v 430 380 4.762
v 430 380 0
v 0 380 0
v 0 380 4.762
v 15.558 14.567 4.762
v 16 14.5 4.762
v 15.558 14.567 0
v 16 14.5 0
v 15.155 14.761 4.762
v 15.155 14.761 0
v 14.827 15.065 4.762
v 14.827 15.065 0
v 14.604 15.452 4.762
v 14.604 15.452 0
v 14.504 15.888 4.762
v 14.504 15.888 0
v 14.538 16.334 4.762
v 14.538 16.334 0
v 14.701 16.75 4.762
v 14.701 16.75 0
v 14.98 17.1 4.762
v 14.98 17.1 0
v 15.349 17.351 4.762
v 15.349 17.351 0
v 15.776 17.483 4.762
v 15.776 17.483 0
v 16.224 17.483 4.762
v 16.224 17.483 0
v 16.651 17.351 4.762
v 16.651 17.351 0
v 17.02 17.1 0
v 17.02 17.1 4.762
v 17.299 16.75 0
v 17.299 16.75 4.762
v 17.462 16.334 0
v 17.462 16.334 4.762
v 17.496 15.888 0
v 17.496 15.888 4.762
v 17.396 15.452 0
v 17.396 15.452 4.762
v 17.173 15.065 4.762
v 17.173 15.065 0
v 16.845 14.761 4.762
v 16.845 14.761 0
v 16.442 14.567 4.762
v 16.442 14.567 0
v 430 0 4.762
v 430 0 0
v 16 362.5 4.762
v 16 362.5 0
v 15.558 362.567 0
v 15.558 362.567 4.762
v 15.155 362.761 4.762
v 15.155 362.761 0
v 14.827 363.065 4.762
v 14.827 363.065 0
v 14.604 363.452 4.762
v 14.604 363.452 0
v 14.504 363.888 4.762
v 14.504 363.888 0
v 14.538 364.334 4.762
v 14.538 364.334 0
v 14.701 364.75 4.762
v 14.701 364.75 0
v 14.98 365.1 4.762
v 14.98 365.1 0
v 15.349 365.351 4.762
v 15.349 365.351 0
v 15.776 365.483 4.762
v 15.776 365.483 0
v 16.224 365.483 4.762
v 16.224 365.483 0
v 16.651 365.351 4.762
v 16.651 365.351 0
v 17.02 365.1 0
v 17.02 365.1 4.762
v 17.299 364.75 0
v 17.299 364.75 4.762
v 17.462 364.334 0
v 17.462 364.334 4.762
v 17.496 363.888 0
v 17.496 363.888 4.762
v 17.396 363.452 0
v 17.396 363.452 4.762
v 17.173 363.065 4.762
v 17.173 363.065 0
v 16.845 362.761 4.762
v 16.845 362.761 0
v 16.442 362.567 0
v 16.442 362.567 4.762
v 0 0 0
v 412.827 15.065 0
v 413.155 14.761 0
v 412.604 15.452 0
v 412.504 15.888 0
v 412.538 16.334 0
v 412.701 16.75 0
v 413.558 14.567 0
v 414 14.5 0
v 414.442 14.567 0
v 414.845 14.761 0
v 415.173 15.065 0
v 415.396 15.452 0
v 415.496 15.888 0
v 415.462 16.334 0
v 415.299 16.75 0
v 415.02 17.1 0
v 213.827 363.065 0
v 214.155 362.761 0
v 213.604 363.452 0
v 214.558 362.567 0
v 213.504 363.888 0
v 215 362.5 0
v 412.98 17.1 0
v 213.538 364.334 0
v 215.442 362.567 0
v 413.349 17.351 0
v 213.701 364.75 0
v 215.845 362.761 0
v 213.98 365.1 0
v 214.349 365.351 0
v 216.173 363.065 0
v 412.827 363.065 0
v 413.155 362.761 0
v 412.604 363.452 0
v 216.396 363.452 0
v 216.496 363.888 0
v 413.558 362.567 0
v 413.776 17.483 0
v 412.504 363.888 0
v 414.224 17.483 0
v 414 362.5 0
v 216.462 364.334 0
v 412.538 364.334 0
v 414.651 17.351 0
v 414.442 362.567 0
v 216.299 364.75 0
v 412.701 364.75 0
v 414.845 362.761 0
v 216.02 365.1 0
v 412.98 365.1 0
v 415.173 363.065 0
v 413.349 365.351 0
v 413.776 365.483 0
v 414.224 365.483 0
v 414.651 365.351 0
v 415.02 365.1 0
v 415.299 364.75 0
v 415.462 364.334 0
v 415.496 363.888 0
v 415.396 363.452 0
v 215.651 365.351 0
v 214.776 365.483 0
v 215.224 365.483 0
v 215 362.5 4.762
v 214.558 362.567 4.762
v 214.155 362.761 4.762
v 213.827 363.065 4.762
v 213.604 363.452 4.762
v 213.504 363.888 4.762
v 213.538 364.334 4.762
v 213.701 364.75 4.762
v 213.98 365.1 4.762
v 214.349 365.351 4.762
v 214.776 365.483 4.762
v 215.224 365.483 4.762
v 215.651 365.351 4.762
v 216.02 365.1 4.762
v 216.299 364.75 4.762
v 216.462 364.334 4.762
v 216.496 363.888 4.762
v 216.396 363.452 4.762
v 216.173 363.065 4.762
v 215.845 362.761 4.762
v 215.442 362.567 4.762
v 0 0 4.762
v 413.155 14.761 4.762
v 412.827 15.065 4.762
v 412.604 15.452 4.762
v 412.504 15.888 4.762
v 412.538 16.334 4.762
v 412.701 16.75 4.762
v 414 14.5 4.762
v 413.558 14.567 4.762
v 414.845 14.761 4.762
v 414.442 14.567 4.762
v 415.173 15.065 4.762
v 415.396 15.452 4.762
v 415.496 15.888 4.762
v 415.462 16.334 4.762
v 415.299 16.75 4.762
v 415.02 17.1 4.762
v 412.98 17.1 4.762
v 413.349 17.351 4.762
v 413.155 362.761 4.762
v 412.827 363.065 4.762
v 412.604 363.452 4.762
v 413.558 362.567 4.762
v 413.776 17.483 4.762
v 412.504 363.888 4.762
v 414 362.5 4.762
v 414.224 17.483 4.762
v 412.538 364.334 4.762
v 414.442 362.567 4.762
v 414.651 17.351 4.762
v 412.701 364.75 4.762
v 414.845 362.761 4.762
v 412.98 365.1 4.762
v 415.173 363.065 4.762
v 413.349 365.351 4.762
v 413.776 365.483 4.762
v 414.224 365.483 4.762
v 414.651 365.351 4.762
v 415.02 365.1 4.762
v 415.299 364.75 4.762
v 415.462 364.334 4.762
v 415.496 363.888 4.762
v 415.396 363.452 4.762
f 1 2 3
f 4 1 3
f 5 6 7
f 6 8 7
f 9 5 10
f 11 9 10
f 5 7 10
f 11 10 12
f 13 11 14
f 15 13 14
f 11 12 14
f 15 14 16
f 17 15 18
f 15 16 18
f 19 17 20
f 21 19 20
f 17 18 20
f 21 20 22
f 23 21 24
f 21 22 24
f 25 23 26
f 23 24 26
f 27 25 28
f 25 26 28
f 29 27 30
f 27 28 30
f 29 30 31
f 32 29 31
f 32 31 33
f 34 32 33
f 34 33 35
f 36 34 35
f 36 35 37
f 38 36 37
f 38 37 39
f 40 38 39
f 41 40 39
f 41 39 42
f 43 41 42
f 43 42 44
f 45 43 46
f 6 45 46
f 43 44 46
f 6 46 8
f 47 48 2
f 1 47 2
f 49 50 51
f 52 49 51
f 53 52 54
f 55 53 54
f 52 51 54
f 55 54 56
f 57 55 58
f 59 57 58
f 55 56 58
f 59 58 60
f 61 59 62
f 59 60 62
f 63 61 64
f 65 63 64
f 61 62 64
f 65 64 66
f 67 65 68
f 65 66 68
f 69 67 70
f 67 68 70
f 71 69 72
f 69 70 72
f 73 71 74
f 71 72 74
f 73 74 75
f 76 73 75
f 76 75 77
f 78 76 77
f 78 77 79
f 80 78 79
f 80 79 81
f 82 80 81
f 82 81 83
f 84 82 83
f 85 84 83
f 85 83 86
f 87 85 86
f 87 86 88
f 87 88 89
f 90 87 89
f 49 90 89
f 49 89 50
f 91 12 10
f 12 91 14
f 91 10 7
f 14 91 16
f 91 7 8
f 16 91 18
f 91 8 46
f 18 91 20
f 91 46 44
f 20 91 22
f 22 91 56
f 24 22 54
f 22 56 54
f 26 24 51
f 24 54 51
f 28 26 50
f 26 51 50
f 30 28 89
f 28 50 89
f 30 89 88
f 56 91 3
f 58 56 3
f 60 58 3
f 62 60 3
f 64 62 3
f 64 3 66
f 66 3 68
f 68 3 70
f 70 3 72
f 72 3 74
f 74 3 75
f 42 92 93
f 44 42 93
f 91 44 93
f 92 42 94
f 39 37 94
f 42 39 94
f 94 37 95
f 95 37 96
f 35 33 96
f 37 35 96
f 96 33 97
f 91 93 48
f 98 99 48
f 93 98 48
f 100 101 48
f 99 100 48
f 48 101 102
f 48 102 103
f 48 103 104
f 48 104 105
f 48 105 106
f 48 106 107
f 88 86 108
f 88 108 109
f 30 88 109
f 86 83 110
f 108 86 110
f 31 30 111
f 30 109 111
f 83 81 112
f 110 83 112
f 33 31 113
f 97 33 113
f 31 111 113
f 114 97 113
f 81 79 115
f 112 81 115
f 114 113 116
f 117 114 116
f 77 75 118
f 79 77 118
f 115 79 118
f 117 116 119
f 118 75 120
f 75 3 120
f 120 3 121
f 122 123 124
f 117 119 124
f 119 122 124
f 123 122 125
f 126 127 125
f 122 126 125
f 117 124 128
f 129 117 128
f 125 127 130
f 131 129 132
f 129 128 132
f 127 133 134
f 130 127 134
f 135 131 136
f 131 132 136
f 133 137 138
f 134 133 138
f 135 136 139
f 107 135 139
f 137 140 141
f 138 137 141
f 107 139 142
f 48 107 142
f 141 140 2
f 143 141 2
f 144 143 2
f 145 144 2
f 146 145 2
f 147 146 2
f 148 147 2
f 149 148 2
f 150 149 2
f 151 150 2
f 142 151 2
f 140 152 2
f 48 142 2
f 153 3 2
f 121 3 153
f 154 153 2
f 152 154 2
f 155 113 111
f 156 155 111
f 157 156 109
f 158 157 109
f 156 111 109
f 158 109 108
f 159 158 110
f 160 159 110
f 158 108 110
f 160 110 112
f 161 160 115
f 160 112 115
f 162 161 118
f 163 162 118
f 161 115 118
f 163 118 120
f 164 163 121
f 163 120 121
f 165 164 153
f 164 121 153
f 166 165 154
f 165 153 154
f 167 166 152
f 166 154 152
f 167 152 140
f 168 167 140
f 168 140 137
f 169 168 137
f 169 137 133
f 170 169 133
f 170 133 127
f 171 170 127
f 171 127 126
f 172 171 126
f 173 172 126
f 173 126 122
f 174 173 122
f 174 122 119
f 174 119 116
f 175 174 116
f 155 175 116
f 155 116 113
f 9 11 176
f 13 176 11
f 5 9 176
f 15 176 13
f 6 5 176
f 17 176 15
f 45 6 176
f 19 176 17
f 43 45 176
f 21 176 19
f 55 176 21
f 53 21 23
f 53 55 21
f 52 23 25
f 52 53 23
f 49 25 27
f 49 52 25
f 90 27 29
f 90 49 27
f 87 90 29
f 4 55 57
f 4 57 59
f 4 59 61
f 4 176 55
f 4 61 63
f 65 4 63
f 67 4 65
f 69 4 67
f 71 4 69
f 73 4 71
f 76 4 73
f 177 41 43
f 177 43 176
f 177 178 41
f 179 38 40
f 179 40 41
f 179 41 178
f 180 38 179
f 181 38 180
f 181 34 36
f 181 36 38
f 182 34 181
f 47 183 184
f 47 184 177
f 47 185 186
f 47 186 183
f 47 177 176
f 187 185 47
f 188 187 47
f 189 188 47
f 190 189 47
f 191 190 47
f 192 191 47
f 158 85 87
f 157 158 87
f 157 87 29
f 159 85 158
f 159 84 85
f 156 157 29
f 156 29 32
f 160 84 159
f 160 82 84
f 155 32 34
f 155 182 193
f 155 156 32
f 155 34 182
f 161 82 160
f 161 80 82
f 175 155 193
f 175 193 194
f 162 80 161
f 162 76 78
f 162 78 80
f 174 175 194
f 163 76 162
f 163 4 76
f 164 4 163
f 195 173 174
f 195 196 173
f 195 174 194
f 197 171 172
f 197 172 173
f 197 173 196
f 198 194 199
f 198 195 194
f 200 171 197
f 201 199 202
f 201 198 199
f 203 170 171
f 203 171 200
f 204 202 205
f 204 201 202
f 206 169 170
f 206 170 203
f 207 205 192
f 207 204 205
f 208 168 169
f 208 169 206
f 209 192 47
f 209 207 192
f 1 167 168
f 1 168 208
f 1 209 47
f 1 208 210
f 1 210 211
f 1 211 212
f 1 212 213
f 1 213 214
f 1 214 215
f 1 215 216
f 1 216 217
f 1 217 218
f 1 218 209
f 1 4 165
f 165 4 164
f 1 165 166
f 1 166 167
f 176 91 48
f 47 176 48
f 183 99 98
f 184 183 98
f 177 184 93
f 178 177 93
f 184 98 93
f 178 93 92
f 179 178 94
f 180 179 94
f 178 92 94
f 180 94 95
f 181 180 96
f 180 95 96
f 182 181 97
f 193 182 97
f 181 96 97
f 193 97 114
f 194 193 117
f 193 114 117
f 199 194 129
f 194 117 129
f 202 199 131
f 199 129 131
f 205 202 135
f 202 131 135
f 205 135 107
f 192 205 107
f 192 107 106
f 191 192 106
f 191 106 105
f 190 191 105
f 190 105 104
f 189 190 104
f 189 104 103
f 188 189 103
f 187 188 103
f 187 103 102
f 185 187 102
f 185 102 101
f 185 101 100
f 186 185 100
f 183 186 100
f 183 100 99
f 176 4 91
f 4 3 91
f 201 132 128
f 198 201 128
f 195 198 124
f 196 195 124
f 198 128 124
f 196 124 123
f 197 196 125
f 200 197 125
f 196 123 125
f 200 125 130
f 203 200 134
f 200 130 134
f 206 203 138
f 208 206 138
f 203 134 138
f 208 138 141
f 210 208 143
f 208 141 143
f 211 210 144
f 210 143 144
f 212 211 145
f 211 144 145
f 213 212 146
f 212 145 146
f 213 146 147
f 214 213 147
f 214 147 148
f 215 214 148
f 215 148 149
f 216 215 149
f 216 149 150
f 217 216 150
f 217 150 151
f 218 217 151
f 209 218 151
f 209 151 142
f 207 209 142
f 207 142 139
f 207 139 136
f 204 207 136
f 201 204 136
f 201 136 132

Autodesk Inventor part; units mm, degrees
ref_plane "YZ Plane" through (0, 0, 0) normal (1, 0, 0) x (0, 1, 0)
ref_plane "XZ Plane" through (0, 0, 0) normal (0, 1, 0) x (-1, 0, 0)
ref_plane "XY Plane" through (0, 0, 0) normal (0, 0, 1) x (1, 0, 0)
sketch "Sketch1" plane through (0, 0, 0) normal (0, 0, 1) x (1, 0, 0)
  line L0 (0, 0) -> (430, 0)
  line L1 (430, 0) -> (430, 380)
  line L2 (430, 380) -> (0, 380)
  line L3 (0, 380) -> (0, 0)
  dimension "d0" = 430
  dimension "d1" = 380
extrude "Extrusion1" add sketch "Sketch1" along normal blind 4.7625
sketch "Sketch2" plane through (0, 0, 4.7625) normal (0, 0, 1) x (1, 0, 0)
  line L0 (0, 0) -> (430, 0) projected
  line L1 (430, 0) -> (430, 380) projected
  line L2 (430, 380) -> (0, 380) projected
  line L3 (0, 380) -> (0, 0) projected
  point P0 (16, 364)
  point P1 (215, 364)
  point P2 (16, 16)
  point P3 (414, 16)
  point P4 (414, 364)
  dimension "d17" = 16
  dimension "d18" = 16
  dimension "d19" = 16
  dimension "d21" = 16
  dimension "d22" = 215
hole "Hole1" at (16, 364, 4.7625) at (215, 364, 4.7625) at (16, 16, 4.7625) at (414, 16, 4.7625) at (414, 364, 4.7625) direction (0, 0, -1) diameter 3 end through all
properties part number "ElectronicsLowerPanel" material "ABS Plastic"
